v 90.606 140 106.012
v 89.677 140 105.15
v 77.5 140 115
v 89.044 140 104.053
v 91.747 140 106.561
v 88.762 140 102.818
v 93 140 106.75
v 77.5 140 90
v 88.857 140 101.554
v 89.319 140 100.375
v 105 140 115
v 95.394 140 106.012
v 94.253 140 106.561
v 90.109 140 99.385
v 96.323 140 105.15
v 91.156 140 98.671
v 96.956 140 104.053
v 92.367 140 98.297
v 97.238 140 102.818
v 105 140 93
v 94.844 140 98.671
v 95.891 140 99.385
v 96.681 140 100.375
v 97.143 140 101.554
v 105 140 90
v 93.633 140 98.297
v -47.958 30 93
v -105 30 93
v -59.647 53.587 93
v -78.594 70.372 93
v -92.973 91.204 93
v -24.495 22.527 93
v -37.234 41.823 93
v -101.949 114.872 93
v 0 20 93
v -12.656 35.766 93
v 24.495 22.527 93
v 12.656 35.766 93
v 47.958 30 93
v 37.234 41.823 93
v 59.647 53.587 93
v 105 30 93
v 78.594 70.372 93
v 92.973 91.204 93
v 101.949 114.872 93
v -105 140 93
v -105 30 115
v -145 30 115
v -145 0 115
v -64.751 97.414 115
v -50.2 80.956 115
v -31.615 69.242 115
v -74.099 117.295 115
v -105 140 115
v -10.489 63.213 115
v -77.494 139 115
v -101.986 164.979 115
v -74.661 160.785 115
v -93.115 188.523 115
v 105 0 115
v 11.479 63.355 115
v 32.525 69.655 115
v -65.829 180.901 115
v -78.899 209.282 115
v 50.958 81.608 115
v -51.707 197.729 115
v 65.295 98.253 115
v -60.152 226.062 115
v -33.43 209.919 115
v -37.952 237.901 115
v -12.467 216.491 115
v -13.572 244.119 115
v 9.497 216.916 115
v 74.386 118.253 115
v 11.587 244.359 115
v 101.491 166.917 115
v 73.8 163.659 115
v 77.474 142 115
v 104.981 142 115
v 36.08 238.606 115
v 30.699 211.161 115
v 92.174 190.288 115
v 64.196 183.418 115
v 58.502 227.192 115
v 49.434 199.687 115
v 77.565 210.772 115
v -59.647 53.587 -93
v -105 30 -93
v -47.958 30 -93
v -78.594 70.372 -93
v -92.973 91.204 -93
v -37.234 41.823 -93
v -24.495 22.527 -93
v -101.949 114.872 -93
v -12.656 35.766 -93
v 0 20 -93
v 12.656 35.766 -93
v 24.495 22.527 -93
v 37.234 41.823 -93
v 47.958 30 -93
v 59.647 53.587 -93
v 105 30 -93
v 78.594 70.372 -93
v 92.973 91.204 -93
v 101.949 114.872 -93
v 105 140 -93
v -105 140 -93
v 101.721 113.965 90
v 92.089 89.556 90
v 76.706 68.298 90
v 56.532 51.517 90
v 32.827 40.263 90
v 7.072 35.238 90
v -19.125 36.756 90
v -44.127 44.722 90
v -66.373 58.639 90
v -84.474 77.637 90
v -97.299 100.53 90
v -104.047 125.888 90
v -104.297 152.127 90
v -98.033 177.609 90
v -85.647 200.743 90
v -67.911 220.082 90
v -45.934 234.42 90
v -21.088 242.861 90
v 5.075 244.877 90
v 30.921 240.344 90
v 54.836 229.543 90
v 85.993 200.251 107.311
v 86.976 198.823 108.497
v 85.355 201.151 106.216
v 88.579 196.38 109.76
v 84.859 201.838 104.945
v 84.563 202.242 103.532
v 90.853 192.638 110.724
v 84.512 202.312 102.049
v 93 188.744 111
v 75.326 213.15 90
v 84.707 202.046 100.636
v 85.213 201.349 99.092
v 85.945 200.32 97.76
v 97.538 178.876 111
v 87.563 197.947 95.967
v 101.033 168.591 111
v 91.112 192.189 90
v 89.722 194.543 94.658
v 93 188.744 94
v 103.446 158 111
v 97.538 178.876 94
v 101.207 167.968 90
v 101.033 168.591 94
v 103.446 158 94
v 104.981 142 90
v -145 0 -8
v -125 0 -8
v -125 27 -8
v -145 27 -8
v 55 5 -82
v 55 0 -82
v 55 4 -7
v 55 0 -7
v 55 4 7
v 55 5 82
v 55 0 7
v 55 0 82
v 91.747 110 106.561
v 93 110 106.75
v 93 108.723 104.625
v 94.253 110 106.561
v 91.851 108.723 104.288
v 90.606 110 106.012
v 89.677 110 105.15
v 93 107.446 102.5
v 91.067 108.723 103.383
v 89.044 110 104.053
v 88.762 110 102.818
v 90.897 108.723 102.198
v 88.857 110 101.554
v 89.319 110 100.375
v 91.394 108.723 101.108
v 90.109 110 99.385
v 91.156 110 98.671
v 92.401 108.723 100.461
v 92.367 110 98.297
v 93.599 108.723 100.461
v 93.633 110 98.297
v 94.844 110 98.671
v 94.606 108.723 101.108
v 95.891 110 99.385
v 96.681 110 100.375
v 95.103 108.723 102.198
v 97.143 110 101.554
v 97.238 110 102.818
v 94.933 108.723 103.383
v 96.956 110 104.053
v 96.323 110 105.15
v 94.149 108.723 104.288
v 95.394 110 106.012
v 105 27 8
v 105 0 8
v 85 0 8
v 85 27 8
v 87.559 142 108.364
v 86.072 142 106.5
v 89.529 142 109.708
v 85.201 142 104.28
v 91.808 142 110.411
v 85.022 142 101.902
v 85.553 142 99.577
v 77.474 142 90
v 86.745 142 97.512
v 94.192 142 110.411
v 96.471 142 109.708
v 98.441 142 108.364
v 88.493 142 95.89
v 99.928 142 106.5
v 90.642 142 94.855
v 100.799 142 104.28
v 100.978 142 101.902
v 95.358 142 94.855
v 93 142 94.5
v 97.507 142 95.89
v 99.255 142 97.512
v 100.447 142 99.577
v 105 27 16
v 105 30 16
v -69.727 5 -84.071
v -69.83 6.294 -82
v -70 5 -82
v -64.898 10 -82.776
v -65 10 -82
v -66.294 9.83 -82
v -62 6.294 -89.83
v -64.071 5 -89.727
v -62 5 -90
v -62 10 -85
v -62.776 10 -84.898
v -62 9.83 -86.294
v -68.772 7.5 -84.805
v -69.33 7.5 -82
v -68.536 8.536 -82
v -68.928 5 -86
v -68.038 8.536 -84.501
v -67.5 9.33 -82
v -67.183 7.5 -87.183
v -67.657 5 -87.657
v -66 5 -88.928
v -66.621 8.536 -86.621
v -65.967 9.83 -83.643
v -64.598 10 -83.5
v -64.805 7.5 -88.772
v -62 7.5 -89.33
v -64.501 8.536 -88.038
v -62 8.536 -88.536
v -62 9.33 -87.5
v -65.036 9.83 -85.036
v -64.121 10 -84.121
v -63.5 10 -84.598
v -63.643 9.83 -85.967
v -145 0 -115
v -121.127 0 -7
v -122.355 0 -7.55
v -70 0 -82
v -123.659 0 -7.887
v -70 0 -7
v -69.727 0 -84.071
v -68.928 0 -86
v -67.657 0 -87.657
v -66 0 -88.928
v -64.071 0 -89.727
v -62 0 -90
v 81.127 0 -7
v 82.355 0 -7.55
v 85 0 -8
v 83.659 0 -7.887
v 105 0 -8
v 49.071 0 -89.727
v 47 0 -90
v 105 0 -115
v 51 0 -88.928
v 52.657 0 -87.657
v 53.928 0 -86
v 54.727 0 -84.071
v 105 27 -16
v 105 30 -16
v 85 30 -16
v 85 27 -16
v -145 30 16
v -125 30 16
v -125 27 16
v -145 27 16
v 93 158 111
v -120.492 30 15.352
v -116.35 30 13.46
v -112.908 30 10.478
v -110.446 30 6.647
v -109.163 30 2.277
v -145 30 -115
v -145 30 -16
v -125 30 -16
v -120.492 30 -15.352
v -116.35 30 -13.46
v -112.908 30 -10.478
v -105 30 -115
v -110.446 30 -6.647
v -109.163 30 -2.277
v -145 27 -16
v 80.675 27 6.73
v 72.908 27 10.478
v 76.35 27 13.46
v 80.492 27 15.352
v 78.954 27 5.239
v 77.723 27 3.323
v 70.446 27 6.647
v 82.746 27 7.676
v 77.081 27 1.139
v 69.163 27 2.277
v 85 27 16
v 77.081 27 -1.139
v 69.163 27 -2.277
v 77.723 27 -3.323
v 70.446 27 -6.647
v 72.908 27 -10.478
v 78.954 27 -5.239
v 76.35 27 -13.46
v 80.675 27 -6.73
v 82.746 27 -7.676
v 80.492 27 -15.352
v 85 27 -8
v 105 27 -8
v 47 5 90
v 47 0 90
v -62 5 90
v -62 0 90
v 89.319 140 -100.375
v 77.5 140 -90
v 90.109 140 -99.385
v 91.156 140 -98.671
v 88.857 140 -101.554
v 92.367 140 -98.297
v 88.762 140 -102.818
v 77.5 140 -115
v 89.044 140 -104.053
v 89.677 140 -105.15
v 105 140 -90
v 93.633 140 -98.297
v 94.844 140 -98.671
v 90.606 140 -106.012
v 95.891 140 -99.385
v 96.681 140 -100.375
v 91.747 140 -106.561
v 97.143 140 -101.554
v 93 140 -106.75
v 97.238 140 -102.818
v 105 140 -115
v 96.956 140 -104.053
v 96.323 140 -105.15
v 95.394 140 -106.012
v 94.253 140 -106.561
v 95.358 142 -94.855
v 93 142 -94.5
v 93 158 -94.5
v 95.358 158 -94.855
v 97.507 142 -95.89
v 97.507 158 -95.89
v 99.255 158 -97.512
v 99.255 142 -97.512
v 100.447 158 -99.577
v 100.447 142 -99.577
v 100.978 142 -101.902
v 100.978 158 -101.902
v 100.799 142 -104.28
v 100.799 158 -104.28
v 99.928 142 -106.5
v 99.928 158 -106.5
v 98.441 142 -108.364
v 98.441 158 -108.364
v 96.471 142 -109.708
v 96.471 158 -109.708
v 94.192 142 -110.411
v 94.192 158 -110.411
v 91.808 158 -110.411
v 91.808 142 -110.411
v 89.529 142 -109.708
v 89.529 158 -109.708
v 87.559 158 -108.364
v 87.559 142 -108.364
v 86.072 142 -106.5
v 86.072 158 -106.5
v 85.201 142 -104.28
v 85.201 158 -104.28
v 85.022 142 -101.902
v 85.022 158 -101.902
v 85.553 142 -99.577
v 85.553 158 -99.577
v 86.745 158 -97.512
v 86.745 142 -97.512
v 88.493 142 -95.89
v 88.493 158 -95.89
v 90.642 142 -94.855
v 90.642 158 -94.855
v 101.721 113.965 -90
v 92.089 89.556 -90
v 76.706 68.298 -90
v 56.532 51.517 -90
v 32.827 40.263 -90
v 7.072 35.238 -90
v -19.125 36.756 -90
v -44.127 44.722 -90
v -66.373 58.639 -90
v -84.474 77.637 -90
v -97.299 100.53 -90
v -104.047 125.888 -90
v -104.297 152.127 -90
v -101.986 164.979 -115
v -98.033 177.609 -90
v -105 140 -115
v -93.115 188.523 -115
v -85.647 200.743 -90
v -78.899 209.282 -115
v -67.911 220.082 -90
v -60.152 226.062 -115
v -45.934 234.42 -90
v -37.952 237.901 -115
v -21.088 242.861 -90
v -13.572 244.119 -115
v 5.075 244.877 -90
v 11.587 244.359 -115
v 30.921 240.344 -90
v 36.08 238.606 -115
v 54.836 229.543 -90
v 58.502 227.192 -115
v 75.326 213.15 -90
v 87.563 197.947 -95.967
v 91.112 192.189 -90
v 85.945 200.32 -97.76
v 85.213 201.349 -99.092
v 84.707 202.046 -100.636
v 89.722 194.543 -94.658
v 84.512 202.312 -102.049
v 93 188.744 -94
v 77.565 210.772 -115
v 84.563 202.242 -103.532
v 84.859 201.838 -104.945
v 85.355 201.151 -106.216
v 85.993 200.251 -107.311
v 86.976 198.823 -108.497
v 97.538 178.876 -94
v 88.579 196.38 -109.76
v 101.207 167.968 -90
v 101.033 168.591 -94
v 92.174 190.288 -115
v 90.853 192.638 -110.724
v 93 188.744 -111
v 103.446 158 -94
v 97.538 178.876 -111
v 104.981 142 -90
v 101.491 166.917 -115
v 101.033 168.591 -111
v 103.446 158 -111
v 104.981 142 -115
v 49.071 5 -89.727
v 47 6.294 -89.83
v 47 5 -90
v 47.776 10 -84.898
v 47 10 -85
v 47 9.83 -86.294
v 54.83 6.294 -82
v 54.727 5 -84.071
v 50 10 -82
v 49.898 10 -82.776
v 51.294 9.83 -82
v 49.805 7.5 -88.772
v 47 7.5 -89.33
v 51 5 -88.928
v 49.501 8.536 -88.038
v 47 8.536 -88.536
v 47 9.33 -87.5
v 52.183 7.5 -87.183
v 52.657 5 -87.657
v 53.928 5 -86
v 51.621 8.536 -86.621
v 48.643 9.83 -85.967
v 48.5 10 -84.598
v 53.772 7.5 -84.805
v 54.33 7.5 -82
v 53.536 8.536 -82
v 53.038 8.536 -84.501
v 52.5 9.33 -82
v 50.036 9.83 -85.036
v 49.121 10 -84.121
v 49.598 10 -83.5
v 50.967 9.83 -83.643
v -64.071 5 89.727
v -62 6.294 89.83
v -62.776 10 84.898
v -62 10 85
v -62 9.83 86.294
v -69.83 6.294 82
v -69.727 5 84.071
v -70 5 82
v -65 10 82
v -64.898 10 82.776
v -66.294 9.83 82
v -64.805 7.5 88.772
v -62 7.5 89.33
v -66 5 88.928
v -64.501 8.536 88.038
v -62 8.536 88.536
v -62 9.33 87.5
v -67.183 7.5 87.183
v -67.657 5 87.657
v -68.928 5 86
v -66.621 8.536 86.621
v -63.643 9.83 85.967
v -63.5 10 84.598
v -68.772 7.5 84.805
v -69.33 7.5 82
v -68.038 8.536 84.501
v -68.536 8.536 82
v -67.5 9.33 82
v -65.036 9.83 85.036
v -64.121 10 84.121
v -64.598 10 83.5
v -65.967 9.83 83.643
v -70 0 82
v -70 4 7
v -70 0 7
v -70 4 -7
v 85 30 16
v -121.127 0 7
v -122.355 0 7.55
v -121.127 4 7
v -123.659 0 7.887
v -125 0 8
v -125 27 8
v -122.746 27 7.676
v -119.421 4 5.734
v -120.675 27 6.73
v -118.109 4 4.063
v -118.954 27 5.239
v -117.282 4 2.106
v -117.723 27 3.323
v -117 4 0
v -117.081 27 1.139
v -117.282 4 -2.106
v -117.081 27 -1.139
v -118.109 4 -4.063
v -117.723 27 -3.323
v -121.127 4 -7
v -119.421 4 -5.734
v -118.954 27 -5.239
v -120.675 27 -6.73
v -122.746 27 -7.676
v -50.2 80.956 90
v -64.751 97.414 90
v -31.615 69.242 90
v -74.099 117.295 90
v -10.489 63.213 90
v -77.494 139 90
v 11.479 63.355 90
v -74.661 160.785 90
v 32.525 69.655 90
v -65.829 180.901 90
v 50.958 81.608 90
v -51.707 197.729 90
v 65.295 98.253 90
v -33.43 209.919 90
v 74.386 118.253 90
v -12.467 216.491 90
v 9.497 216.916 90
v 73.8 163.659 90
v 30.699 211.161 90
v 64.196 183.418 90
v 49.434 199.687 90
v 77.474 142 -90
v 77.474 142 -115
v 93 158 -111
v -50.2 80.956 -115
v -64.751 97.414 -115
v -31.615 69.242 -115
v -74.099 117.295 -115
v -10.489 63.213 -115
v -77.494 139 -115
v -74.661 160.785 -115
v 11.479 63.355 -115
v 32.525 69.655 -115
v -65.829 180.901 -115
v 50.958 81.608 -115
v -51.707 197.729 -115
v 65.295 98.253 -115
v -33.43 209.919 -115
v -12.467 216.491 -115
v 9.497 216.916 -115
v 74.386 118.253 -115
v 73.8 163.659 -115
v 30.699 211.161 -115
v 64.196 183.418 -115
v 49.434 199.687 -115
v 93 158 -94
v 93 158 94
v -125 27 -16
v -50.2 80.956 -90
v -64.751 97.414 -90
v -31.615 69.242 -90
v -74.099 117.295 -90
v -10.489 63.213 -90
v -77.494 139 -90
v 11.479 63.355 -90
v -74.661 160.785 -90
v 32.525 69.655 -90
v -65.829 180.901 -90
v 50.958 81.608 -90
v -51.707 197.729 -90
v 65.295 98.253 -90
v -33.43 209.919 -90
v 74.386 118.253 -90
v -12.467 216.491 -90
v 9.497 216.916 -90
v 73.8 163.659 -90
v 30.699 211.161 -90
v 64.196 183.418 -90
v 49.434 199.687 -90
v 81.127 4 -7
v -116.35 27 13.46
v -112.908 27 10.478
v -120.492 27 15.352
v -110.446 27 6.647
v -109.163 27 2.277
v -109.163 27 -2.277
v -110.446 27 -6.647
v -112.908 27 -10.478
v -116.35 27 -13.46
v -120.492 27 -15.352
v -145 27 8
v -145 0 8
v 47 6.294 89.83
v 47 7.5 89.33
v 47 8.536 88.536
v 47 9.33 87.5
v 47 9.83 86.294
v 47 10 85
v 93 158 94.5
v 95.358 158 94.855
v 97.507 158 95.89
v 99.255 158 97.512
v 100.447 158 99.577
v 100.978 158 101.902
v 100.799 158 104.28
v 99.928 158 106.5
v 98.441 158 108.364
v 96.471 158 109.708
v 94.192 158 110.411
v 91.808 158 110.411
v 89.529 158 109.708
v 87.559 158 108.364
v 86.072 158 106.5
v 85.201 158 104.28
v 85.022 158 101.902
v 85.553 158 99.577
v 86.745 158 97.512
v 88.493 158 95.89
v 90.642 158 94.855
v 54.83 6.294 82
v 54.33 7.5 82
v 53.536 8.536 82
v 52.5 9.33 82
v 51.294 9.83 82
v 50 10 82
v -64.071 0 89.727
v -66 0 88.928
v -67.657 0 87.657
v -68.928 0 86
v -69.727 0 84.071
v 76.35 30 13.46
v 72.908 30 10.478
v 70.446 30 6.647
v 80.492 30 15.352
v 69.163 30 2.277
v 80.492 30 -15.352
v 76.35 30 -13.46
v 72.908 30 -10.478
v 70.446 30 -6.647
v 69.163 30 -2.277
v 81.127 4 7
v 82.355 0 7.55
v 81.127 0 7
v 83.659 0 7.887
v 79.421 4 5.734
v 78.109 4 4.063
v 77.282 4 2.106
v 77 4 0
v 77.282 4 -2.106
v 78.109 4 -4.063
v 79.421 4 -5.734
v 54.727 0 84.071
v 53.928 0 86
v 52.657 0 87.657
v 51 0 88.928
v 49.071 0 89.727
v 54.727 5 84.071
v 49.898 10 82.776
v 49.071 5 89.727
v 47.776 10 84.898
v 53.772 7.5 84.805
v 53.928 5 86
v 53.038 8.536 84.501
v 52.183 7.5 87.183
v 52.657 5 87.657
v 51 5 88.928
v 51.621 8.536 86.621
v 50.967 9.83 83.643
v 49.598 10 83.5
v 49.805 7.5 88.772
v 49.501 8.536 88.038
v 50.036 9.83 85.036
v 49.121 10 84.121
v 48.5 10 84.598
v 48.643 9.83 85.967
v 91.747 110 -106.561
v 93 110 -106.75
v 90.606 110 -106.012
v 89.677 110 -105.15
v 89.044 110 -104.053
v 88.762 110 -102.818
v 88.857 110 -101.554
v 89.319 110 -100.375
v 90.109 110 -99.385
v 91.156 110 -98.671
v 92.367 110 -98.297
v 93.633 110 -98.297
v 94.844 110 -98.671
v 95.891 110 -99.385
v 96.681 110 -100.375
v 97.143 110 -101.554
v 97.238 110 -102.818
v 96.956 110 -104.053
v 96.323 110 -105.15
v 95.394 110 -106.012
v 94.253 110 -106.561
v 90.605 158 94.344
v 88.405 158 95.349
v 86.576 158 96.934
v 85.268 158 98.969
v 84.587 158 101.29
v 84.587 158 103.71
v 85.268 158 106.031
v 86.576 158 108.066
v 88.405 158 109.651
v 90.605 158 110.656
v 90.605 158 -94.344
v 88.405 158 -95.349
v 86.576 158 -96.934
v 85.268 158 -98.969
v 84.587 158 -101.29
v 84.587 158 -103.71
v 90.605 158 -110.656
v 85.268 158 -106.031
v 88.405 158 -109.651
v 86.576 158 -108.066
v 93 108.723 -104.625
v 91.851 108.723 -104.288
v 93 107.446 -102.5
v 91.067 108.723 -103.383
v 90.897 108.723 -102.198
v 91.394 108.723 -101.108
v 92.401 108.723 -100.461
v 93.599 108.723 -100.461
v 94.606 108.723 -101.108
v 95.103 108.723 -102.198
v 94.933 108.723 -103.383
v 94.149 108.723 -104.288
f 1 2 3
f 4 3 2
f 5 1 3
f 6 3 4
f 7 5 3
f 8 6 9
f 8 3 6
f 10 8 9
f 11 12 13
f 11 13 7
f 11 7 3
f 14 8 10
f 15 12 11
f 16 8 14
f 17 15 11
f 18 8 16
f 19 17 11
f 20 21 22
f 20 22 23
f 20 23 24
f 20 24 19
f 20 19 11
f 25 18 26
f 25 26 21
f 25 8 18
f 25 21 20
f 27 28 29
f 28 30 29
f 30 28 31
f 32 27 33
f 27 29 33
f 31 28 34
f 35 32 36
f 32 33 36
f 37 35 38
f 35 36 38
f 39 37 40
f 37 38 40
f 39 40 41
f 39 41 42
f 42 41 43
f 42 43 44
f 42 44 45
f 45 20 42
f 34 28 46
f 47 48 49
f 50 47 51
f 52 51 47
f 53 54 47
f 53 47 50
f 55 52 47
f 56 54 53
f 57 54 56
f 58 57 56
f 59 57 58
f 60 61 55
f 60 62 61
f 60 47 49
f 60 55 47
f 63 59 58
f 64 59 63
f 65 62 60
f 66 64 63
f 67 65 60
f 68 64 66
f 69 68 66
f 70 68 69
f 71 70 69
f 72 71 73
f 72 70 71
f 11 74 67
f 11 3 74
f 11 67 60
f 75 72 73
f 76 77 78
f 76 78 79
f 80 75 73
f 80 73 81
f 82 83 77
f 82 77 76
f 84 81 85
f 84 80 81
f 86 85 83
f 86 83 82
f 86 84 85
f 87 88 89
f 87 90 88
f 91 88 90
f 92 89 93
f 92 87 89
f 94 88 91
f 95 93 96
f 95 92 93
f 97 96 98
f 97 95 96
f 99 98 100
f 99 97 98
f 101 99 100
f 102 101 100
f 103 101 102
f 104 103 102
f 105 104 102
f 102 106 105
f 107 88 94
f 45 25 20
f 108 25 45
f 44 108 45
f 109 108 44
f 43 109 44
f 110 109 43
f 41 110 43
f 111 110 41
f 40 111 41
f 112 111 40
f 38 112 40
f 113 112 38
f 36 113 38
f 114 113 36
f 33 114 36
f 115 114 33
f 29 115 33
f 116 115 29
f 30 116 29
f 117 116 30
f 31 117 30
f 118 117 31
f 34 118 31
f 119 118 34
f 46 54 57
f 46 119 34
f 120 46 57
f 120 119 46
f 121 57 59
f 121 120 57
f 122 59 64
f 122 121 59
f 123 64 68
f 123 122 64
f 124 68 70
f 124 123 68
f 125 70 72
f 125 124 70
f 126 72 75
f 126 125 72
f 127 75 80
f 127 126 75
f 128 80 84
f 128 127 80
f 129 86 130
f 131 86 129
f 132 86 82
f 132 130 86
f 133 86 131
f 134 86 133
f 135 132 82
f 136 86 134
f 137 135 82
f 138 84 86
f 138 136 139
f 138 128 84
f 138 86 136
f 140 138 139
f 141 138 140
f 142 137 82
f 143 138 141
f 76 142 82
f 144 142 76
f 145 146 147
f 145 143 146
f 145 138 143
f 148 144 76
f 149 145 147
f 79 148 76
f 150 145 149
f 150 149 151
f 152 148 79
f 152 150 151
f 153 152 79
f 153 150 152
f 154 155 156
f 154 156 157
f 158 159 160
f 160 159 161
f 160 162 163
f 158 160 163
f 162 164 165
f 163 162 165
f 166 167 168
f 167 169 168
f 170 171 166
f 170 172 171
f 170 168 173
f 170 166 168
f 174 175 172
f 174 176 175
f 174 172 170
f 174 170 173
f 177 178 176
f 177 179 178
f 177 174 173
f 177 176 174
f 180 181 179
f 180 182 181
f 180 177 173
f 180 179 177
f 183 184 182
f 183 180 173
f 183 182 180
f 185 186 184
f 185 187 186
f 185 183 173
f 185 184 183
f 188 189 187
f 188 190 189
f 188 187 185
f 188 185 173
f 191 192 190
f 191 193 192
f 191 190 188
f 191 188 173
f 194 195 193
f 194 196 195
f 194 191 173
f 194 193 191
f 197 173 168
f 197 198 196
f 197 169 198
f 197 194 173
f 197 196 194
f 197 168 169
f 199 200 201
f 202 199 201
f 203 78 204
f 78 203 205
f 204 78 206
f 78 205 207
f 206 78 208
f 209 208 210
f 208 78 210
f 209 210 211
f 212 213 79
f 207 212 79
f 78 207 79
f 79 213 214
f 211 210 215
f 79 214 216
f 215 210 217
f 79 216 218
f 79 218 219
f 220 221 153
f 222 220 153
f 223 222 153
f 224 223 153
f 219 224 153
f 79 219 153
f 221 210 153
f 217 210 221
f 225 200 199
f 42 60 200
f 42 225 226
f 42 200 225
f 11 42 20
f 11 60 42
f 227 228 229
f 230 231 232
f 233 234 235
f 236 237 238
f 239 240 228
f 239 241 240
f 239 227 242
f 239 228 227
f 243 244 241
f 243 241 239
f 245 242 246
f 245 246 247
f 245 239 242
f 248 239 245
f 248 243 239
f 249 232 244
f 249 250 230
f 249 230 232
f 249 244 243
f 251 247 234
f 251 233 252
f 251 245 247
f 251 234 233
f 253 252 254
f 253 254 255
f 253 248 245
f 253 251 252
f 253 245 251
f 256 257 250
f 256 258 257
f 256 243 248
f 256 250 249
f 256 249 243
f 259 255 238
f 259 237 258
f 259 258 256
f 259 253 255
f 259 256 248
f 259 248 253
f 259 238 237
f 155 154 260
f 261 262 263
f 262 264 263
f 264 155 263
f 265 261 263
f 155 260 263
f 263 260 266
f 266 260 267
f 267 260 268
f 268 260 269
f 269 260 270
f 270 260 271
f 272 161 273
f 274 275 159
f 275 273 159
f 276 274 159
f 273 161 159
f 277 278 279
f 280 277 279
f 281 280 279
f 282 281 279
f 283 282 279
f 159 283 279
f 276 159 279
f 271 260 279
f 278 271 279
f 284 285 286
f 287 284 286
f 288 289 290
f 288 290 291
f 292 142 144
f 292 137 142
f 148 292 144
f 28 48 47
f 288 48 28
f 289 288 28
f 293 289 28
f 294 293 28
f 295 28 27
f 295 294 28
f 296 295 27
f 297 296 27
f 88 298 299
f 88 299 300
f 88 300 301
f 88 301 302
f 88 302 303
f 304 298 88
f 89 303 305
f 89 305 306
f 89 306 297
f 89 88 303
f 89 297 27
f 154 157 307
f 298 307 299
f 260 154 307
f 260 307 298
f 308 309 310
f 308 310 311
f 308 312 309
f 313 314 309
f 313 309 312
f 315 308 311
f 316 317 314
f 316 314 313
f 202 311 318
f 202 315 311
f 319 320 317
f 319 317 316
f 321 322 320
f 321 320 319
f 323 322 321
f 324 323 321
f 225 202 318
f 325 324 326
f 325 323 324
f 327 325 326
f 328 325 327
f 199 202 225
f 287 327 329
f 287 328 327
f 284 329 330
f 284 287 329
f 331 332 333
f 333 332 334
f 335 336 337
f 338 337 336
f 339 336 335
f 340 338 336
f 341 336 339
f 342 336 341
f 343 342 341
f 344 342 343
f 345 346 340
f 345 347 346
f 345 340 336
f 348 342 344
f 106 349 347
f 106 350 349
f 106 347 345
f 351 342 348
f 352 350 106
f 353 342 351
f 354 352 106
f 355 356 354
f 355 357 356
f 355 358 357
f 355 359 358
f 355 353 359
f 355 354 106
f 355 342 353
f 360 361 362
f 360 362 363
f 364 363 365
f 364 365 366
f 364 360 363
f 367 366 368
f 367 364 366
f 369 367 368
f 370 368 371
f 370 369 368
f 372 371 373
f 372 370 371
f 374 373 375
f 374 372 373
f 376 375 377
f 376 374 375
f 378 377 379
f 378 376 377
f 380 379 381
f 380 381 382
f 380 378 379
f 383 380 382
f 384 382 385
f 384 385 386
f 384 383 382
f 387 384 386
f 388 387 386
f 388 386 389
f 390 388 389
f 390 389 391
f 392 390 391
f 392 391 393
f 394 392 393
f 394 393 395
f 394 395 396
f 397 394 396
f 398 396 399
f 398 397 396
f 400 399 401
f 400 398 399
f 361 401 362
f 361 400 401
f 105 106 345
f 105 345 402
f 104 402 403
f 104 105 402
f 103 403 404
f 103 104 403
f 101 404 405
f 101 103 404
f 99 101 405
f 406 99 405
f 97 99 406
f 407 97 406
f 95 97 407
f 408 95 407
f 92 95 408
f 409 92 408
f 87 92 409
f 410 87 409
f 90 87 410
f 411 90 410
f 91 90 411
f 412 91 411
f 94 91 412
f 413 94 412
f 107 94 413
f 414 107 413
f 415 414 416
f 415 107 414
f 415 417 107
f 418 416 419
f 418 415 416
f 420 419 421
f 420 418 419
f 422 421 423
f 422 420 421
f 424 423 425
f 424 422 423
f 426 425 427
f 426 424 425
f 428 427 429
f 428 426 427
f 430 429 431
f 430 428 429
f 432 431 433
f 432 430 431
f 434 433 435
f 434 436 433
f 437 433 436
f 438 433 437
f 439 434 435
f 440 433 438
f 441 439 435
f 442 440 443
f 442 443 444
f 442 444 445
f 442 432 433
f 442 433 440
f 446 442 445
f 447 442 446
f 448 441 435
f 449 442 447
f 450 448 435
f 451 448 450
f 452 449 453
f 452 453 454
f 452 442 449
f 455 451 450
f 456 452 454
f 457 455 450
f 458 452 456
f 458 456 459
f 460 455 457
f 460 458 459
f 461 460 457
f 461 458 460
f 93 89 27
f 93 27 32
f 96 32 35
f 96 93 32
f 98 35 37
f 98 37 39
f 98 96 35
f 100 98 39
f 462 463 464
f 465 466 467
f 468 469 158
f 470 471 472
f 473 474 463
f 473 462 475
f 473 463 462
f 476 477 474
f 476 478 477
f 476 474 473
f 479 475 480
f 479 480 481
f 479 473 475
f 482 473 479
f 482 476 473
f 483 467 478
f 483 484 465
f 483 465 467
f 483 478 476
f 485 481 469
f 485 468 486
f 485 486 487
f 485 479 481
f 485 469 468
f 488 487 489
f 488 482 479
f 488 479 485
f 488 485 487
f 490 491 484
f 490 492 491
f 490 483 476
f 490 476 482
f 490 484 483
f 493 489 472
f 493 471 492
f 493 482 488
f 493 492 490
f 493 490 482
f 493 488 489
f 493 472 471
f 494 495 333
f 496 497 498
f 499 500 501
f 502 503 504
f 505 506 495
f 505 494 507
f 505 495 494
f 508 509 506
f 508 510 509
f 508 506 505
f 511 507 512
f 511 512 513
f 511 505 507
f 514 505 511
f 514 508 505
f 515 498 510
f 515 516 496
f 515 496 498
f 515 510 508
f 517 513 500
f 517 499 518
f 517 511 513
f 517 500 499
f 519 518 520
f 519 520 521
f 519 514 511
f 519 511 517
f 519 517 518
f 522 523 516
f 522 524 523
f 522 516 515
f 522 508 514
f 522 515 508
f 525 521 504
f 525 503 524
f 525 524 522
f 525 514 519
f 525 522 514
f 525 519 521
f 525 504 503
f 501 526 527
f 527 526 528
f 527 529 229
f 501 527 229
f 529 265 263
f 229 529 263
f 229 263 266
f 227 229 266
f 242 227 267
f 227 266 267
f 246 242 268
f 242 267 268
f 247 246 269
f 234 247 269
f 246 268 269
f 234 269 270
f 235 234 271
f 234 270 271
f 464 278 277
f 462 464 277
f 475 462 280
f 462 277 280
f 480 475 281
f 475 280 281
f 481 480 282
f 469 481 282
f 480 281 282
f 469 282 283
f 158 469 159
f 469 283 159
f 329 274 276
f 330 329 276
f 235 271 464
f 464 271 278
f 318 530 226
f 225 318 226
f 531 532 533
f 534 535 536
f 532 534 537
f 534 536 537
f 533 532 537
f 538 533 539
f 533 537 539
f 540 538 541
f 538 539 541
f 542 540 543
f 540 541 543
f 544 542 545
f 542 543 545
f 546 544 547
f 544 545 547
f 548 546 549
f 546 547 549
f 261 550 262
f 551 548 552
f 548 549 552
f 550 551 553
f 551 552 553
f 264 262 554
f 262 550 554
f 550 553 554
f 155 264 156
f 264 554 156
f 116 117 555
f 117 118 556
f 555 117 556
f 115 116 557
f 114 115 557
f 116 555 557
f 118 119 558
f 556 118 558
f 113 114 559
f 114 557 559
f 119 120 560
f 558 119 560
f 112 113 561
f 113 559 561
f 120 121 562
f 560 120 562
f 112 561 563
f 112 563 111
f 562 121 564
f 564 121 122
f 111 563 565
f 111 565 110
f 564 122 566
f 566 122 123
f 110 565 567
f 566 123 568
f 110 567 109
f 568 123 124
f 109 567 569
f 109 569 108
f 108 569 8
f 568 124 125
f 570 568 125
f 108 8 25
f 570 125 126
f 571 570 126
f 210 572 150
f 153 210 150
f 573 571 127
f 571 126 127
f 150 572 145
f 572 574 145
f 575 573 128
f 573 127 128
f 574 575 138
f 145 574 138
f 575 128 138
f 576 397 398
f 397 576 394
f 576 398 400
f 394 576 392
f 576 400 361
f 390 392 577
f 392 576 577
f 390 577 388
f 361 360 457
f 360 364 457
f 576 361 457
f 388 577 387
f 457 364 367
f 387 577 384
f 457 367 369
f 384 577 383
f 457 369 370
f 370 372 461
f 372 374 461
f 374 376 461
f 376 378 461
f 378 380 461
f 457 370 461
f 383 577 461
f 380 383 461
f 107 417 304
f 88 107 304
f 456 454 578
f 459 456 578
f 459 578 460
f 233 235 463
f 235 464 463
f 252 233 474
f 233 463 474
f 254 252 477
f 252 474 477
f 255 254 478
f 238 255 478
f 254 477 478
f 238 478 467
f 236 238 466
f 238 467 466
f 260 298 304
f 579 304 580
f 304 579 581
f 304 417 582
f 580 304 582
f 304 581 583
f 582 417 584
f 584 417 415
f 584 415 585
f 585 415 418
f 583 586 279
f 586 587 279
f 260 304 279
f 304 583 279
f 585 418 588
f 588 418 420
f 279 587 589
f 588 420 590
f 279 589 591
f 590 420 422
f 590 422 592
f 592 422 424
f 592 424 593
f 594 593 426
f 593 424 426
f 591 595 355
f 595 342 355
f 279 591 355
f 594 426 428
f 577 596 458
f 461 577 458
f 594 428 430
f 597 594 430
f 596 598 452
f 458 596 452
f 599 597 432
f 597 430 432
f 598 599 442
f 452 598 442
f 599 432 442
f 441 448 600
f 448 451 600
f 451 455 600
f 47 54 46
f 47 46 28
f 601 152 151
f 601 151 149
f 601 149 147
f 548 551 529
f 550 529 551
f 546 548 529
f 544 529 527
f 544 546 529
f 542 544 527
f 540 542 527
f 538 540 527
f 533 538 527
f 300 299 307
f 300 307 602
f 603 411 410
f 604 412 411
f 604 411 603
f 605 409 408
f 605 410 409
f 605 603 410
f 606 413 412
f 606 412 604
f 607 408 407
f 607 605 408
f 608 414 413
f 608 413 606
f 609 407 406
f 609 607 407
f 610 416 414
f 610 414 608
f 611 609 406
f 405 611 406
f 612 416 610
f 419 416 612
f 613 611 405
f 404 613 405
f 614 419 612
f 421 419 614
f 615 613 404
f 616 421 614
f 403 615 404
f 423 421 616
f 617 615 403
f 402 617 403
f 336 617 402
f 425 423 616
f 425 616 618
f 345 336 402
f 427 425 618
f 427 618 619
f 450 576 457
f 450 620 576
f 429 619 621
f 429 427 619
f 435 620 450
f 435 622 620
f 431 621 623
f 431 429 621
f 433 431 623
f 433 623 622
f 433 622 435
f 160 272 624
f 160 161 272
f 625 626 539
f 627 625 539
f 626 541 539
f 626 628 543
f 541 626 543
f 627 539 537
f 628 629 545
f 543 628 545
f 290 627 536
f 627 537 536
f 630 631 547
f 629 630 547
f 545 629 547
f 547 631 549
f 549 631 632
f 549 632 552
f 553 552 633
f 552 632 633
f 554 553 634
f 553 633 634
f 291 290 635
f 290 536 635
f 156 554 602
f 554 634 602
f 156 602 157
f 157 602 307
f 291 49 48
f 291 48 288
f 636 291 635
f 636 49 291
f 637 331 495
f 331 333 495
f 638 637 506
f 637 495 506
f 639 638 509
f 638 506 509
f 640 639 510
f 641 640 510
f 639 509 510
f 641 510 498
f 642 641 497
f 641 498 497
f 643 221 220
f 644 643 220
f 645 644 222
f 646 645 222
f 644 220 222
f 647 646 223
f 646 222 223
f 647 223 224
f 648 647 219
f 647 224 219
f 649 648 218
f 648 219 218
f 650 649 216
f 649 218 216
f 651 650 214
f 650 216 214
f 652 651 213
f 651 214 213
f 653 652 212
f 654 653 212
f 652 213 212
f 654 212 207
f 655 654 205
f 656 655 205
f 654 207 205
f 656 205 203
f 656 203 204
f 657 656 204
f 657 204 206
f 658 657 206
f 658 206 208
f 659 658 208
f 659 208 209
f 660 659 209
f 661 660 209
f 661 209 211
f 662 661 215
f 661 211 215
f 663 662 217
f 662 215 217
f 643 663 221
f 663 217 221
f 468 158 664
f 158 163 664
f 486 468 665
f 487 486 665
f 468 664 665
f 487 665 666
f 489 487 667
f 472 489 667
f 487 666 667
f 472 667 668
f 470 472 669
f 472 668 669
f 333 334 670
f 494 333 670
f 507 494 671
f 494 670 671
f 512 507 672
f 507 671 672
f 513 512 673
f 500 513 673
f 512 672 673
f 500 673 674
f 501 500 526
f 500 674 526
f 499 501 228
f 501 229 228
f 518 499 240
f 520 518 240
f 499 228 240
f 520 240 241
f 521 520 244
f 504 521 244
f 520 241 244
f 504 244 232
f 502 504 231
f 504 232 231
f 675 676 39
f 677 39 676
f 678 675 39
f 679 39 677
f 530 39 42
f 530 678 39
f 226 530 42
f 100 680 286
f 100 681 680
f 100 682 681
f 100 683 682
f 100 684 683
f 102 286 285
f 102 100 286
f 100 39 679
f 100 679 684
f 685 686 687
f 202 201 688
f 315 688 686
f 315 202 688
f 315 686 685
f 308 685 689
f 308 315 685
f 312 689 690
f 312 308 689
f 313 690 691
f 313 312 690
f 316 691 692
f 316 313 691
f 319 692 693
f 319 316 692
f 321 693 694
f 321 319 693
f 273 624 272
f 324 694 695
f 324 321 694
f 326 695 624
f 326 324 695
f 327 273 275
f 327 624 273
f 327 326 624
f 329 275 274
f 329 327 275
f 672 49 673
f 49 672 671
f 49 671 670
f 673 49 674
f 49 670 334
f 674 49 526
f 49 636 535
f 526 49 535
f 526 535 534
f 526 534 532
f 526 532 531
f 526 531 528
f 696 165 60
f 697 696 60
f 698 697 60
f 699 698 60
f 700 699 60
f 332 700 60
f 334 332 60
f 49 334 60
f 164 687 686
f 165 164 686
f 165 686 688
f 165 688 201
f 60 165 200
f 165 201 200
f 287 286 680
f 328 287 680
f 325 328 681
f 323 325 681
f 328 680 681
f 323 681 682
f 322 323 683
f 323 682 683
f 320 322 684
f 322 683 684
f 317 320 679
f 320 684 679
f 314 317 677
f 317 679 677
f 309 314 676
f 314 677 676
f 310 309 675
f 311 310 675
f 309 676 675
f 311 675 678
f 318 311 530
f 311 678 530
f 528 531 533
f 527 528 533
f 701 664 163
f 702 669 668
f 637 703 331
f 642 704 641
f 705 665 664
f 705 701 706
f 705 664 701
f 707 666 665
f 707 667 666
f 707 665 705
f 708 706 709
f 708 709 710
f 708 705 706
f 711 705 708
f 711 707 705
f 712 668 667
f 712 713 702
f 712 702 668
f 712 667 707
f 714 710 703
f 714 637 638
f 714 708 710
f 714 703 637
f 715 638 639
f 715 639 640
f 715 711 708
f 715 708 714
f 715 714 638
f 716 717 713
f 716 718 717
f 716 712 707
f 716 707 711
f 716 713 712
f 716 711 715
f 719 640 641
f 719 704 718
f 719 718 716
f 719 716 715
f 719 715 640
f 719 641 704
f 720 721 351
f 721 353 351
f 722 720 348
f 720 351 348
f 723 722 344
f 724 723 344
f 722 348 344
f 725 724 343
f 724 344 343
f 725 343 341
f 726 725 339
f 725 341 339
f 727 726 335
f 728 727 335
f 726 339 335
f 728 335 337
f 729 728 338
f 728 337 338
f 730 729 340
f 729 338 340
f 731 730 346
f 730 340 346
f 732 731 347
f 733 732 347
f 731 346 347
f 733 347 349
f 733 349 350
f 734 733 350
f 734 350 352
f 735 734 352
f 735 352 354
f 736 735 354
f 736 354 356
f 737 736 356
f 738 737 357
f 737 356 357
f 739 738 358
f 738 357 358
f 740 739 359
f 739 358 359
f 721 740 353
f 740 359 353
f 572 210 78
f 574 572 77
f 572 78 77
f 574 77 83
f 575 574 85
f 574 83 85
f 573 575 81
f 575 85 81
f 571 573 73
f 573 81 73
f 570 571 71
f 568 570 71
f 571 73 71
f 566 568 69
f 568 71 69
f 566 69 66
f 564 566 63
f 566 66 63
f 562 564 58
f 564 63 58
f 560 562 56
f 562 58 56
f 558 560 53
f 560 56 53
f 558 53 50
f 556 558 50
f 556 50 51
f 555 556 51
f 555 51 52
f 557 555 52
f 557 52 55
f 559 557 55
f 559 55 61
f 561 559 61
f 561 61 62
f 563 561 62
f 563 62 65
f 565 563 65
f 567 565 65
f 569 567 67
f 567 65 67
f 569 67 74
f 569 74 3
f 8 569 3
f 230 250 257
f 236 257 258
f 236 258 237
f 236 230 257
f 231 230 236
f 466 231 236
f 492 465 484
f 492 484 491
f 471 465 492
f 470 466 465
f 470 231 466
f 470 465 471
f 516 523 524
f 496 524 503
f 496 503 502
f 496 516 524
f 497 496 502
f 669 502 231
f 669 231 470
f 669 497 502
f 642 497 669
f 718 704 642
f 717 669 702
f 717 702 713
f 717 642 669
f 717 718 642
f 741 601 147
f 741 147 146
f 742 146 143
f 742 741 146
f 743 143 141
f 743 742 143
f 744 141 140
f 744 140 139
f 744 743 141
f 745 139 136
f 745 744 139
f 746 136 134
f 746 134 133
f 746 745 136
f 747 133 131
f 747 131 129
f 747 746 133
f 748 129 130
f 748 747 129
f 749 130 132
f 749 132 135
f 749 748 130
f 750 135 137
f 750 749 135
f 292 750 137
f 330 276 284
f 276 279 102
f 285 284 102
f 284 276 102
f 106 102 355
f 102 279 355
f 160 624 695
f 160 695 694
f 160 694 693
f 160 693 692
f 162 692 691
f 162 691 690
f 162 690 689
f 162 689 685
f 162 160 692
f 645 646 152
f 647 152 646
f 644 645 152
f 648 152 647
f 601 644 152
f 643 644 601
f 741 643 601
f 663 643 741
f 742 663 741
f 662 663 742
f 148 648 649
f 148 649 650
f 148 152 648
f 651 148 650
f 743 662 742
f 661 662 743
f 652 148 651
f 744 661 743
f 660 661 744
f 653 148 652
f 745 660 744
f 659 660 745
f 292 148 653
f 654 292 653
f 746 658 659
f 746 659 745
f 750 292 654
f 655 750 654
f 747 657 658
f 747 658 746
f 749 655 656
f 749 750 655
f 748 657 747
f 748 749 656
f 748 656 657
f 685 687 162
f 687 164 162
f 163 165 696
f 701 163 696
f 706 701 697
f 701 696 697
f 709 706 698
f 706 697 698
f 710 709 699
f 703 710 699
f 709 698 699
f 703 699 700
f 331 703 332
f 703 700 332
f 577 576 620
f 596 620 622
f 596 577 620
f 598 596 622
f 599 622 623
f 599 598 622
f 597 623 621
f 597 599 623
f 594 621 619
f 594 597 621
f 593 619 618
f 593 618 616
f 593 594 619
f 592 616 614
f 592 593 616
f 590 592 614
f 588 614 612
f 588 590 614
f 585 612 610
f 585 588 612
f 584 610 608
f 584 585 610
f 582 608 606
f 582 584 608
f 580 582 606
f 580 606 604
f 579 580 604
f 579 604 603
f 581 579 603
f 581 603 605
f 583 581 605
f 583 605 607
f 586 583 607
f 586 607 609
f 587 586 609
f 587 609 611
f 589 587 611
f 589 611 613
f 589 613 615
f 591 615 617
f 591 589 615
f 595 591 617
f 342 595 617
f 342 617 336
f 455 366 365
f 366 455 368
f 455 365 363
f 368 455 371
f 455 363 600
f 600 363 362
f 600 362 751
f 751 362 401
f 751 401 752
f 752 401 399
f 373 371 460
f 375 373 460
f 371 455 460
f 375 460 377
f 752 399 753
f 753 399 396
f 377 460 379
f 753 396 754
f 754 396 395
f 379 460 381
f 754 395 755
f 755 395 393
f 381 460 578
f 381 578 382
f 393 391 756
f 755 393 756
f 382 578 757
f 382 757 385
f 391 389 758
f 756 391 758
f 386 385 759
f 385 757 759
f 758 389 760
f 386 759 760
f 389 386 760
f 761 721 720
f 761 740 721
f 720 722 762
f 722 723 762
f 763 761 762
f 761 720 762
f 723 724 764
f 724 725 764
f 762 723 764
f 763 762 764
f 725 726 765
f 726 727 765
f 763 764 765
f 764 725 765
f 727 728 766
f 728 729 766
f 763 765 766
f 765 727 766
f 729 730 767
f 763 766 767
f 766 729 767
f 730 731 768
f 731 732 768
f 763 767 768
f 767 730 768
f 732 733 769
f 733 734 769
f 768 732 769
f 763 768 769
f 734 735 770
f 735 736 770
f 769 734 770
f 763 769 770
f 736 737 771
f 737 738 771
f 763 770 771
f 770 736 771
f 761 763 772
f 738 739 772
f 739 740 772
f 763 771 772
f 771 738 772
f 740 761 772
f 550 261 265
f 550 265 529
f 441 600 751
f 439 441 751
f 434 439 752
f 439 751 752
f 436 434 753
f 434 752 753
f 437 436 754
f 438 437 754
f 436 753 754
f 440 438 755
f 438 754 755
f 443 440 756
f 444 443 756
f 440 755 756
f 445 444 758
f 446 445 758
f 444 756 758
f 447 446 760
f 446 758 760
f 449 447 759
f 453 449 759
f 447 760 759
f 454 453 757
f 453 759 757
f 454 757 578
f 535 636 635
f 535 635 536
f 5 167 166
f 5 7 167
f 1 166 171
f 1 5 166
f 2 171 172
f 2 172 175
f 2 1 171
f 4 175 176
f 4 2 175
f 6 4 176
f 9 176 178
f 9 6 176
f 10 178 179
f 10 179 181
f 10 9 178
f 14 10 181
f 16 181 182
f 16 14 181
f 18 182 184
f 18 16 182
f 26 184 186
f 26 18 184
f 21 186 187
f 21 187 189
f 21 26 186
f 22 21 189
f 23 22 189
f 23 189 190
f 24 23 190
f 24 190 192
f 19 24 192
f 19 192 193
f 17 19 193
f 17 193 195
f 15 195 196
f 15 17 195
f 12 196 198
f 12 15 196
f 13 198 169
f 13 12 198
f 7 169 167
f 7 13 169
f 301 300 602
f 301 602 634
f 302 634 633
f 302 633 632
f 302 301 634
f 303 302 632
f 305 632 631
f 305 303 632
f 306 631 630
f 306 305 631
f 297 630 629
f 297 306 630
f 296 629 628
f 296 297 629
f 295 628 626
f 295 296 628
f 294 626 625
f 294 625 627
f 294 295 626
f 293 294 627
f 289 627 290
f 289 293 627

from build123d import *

# Parameters (mm, degrees)
SKETCH_2_W                 = 250
SKETCH_2_H                 = 230
EXTRUDE_1_DEPTH            = 30
CUT_EXTRUDE_1_DEPTH        = 3
CUT_EXTRUDE_2_DEPTH        = 188.026736057
CUT_EXTRUDE_3_DEPTH        = 10
FILLET_1_R                 = 5
SKETCH_6_W                 = 14
SKETCH_6_H                 = 8
CUT_EXTRUDE_4_DEPTH        = 277.812210713
SKETCH_7_R                 = 77.5
EXTRUDE_2_DEPTH            = 25
CUT_EXTRUDE_1_2_DEPTH      = 308.042342357
CUT_EXTRUDE_1_2_DEPTH_BACK = 308.042342357
SKETCH_8_W                 = 153.899728908
SKETCH_8_H                 = 2
SKETCH_9_R                 = 8
CUT_EXTRUDE_5_DEPTH        = 16
CUT_EXTRUDE_6_DEPTH        = 244.339269334
CUT_EXTRUDE_START          = -3
CUT_EXTRUDE_7_DEPTH        = 186


with BuildPart() as part:
    # 草图2 → 凸台-拉伸1 (new body)
    with BuildSketch(Plane(origin=(0, 0, 0), x_dir=(1, 0, 0), z_dir=(0, 1, 0))):
        with Locations((-20, 0)):
            Rectangle(SKETCH_2_W, SKETCH_2_H)
    extrude(amount=EXTRUDE_1_DEPTH)

    # 草图3 → Cut-Extrude 1 (cut)
    with BuildSketch(Plane(origin=(0, 30, 0), x_dir=(1, 0, 0), z_dir=(0, 1, 0))):
        with BuildLine():
            Line((-145, 16), (-125, 16))
            ThreePointArc((-125, 16), (-109, 0), (-125, -16))
            Line((-125, -16), (-145, -16))
            ThreePointArc((-145, -16), (-161, 0), (-145, 16))
        make_face()
    cut_extrude_1 = extrude(amount=-CUT_EXTRUDE_1_DEPTH, mode=Mode.SUBTRACT)

    # 草图4 → 切除-拉伸2 (cut, through all)
    with BuildSketch(Plane(origin=(0, 27, 0), x_dir=(1, 0, 0), z_dir=(0, 1, 0))):
        with BuildLine():
            Line((-145, 8), (-145, -8))
            Line((-145, -8), (-125, -8))
            ThreePointArc((-125, -8), (-117, 0), (-125, 8))
            Line((-125, 8), (-145, 8))
        make_face()
    cut_extrude_2 = extrude(amount=-CUT_EXTRUDE_2_DEPTH, mode=Mode.SUBTRACT)

    # 镜向1: Cut-Extrude 1, 切除-拉伸2 across plane
    add(cut_extrude_1.mirror(Plane.ZY.offset(20)), mode=Mode.SUBTRACT)
    add(cut_extrude_2.mirror(Plane.ZY.offset(20)), mode=Mode.SUBTRACT)

    # 草图5 → 切除-拉伸3 (cut)
    with BuildSketch(Plane.XZ):
        with BuildLine():
            Line((-62, -90), (47, -90))
            ThreePointArc((47, -90), (52.656854249, -87.656854249), (55, -82))
            Line((55, -82), (55, 82))
            ThreePointArc((55, 82), (52.656854249, 87.656854249), (47, 90))
            Line((47, 90), (-62, 90))
            ThreePointArc((-62, 90), (-67.656854249, 87.656854249), (-70, 82))
            Line((-70, 82), (-70, -82))
            ThreePointArc((-70, -82), (-67.656854249, -87.656854249), (-62, -90))
        make_face()
    extrude(amount=-CUT_EXTRUDE_3_DEPTH, mode=Mode.SUBTRACT)

    # 圆角1
    fillet_1_edges = [part.edges().sort_by_distance(p)[0] for p in [
        (52.656854249, 10, -87.656854249),
        (-7.5, 10, -90),
        (-67.656854249, 10, -87.656854249),
        (-70, 10, 0),
        (-67.656854249, 10, 87.656854249),
        (-7.5, 10, 90),
        (52.656854249, 10, 87.656854249),
        (55, 10, 0),
    ]]
    fillet(fillet_1_edges, radius=FILLET_1_R)

    # 草图6 → 切除-拉伸4 (cut, through all)
    with BuildSketch(Plane.ZY.offset(145)):
        Rectangle(SKETCH_6_W, SKETCH_6_H)
    extrude(amount=-CUT_EXTRUDE_4_DEPTH, mode=Mode.SUBTRACT)

    # 草图7 → 凸台-拉伸2 (add)
    with BuildSketch(Plane.XY.offset(115)):
        with BuildLine():
            Line((105, 30), (105, 140))
            ThreePointArc((105, 140), (0, 245), (-105, 140))
            Line((-105, 140), (-105, 30))
            Line((-105, 30), (105, 30))
        make_face()
        with Locations((0, 140)):
            Circle(SKETCH_7_R, mode=Mode.SUBTRACT)
    extrude_2 = extrude(amount=-EXTRUDE_2_DEPTH)

    # 镜向2: 凸台-拉伸2 across plane
    add(extrude_2.mirror(Plane.XY))

    # 草图8 → Cut-Extrude 1 2 (cut, two sides: drawn at the far end of the back side and taken through both)
    with BuildSketch(Plane.XY.offset(-CUT_EXTRUDE_1_2_DEPTH_BACK)):
        with Locations((76.949864454, 141)):
            Rectangle(SKETCH_8_W, SKETCH_8_H)
    extrude(amount=CUT_EXTRUDE_1_2_DEPTH + CUT_EXTRUDE_1_2_DEPTH_BACK, mode=Mode.SUBTRACT)

    # 草图9 → 切除-拉伸5 (cut)
    with BuildSketch(Plane.XZ.offset(-142)):
        with Locations(Location((93, 102.5, 0), (0, 0, 270))):
            Circle(SKETCH_9_R)
    cut_extrude_5 = extrude(amount=-CUT_EXTRUDE_5_DEPTH, mode=Mode.SUBTRACT)

    # 草图10 → 切除-拉伸6 (cut, through all)
    with BuildSketch(Plane.XZ.offset(-158)):
        with BuildLine():
            Line((93, 111), (105, 111))
            Line((105, 111), (105, 94))
            Line((105, 94), (93, 94))
            ThreePointArc((93, 94), (84.5, 102.5), (93, 111))
        make_face()
    cut_extrude_6 = extrude(amount=-CUT_EXTRUDE_6_DEPTH, mode=Mode.SUBTRACT)

    # 草图12 → M10 螺纹孔1 (revolve, cut)
    with BuildSketch(Plane(origin=(93, 140, 102.5), x_dir=(0, 0, 1), z_dir=(1, 0, 0))):
        Polygon((0, 0), (0, 32.553657631), (4.25, 30), (4.25, 0), align=None)
    hole_wizard_m10_1 = revolve(axis=Axis((93, 146.35, 102.5), (0, -1, 0)), mode=Mode.SUBTRACT)

    # 镜向3: 切除-拉伸5, 切除-拉伸6, M10 螺纹孔1 across plane
    add(cut_extrude_5.mirror(Plane.XY), mode=Mode.SUBTRACT)
    add(cut_extrude_6.mirror(Plane.XY), mode=Mode.SUBTRACT)
    add(hole_wizard_m10_1.mirror(Plane.XY), mode=Mode.SUBTRACT)

    # 草图13 → 切除-拉伸7 (cut)
    with BuildSketch(Plane.XY.offset(-90).offset(CUT_EXTRUDE_START)):
        with BuildLine():
            Line((47.958315233, 30), (105, 30))
            Line((105, 30), (105, 140))
            ThreePointArc((105, 140), (0, 35), (-105, 140))
            Line((-105, 140), (-105, 30))
            Line((-105, 30), (-47.958315233, 30))
            ThreePointArc((-47.958315233, 30), (0, 20), (47.958315233, 30))
        make_face()
    extrude(amount=CUT_EXTRUDE_7_DEPTH, mode=Mode.SUBTRACT)


solid = part.part
